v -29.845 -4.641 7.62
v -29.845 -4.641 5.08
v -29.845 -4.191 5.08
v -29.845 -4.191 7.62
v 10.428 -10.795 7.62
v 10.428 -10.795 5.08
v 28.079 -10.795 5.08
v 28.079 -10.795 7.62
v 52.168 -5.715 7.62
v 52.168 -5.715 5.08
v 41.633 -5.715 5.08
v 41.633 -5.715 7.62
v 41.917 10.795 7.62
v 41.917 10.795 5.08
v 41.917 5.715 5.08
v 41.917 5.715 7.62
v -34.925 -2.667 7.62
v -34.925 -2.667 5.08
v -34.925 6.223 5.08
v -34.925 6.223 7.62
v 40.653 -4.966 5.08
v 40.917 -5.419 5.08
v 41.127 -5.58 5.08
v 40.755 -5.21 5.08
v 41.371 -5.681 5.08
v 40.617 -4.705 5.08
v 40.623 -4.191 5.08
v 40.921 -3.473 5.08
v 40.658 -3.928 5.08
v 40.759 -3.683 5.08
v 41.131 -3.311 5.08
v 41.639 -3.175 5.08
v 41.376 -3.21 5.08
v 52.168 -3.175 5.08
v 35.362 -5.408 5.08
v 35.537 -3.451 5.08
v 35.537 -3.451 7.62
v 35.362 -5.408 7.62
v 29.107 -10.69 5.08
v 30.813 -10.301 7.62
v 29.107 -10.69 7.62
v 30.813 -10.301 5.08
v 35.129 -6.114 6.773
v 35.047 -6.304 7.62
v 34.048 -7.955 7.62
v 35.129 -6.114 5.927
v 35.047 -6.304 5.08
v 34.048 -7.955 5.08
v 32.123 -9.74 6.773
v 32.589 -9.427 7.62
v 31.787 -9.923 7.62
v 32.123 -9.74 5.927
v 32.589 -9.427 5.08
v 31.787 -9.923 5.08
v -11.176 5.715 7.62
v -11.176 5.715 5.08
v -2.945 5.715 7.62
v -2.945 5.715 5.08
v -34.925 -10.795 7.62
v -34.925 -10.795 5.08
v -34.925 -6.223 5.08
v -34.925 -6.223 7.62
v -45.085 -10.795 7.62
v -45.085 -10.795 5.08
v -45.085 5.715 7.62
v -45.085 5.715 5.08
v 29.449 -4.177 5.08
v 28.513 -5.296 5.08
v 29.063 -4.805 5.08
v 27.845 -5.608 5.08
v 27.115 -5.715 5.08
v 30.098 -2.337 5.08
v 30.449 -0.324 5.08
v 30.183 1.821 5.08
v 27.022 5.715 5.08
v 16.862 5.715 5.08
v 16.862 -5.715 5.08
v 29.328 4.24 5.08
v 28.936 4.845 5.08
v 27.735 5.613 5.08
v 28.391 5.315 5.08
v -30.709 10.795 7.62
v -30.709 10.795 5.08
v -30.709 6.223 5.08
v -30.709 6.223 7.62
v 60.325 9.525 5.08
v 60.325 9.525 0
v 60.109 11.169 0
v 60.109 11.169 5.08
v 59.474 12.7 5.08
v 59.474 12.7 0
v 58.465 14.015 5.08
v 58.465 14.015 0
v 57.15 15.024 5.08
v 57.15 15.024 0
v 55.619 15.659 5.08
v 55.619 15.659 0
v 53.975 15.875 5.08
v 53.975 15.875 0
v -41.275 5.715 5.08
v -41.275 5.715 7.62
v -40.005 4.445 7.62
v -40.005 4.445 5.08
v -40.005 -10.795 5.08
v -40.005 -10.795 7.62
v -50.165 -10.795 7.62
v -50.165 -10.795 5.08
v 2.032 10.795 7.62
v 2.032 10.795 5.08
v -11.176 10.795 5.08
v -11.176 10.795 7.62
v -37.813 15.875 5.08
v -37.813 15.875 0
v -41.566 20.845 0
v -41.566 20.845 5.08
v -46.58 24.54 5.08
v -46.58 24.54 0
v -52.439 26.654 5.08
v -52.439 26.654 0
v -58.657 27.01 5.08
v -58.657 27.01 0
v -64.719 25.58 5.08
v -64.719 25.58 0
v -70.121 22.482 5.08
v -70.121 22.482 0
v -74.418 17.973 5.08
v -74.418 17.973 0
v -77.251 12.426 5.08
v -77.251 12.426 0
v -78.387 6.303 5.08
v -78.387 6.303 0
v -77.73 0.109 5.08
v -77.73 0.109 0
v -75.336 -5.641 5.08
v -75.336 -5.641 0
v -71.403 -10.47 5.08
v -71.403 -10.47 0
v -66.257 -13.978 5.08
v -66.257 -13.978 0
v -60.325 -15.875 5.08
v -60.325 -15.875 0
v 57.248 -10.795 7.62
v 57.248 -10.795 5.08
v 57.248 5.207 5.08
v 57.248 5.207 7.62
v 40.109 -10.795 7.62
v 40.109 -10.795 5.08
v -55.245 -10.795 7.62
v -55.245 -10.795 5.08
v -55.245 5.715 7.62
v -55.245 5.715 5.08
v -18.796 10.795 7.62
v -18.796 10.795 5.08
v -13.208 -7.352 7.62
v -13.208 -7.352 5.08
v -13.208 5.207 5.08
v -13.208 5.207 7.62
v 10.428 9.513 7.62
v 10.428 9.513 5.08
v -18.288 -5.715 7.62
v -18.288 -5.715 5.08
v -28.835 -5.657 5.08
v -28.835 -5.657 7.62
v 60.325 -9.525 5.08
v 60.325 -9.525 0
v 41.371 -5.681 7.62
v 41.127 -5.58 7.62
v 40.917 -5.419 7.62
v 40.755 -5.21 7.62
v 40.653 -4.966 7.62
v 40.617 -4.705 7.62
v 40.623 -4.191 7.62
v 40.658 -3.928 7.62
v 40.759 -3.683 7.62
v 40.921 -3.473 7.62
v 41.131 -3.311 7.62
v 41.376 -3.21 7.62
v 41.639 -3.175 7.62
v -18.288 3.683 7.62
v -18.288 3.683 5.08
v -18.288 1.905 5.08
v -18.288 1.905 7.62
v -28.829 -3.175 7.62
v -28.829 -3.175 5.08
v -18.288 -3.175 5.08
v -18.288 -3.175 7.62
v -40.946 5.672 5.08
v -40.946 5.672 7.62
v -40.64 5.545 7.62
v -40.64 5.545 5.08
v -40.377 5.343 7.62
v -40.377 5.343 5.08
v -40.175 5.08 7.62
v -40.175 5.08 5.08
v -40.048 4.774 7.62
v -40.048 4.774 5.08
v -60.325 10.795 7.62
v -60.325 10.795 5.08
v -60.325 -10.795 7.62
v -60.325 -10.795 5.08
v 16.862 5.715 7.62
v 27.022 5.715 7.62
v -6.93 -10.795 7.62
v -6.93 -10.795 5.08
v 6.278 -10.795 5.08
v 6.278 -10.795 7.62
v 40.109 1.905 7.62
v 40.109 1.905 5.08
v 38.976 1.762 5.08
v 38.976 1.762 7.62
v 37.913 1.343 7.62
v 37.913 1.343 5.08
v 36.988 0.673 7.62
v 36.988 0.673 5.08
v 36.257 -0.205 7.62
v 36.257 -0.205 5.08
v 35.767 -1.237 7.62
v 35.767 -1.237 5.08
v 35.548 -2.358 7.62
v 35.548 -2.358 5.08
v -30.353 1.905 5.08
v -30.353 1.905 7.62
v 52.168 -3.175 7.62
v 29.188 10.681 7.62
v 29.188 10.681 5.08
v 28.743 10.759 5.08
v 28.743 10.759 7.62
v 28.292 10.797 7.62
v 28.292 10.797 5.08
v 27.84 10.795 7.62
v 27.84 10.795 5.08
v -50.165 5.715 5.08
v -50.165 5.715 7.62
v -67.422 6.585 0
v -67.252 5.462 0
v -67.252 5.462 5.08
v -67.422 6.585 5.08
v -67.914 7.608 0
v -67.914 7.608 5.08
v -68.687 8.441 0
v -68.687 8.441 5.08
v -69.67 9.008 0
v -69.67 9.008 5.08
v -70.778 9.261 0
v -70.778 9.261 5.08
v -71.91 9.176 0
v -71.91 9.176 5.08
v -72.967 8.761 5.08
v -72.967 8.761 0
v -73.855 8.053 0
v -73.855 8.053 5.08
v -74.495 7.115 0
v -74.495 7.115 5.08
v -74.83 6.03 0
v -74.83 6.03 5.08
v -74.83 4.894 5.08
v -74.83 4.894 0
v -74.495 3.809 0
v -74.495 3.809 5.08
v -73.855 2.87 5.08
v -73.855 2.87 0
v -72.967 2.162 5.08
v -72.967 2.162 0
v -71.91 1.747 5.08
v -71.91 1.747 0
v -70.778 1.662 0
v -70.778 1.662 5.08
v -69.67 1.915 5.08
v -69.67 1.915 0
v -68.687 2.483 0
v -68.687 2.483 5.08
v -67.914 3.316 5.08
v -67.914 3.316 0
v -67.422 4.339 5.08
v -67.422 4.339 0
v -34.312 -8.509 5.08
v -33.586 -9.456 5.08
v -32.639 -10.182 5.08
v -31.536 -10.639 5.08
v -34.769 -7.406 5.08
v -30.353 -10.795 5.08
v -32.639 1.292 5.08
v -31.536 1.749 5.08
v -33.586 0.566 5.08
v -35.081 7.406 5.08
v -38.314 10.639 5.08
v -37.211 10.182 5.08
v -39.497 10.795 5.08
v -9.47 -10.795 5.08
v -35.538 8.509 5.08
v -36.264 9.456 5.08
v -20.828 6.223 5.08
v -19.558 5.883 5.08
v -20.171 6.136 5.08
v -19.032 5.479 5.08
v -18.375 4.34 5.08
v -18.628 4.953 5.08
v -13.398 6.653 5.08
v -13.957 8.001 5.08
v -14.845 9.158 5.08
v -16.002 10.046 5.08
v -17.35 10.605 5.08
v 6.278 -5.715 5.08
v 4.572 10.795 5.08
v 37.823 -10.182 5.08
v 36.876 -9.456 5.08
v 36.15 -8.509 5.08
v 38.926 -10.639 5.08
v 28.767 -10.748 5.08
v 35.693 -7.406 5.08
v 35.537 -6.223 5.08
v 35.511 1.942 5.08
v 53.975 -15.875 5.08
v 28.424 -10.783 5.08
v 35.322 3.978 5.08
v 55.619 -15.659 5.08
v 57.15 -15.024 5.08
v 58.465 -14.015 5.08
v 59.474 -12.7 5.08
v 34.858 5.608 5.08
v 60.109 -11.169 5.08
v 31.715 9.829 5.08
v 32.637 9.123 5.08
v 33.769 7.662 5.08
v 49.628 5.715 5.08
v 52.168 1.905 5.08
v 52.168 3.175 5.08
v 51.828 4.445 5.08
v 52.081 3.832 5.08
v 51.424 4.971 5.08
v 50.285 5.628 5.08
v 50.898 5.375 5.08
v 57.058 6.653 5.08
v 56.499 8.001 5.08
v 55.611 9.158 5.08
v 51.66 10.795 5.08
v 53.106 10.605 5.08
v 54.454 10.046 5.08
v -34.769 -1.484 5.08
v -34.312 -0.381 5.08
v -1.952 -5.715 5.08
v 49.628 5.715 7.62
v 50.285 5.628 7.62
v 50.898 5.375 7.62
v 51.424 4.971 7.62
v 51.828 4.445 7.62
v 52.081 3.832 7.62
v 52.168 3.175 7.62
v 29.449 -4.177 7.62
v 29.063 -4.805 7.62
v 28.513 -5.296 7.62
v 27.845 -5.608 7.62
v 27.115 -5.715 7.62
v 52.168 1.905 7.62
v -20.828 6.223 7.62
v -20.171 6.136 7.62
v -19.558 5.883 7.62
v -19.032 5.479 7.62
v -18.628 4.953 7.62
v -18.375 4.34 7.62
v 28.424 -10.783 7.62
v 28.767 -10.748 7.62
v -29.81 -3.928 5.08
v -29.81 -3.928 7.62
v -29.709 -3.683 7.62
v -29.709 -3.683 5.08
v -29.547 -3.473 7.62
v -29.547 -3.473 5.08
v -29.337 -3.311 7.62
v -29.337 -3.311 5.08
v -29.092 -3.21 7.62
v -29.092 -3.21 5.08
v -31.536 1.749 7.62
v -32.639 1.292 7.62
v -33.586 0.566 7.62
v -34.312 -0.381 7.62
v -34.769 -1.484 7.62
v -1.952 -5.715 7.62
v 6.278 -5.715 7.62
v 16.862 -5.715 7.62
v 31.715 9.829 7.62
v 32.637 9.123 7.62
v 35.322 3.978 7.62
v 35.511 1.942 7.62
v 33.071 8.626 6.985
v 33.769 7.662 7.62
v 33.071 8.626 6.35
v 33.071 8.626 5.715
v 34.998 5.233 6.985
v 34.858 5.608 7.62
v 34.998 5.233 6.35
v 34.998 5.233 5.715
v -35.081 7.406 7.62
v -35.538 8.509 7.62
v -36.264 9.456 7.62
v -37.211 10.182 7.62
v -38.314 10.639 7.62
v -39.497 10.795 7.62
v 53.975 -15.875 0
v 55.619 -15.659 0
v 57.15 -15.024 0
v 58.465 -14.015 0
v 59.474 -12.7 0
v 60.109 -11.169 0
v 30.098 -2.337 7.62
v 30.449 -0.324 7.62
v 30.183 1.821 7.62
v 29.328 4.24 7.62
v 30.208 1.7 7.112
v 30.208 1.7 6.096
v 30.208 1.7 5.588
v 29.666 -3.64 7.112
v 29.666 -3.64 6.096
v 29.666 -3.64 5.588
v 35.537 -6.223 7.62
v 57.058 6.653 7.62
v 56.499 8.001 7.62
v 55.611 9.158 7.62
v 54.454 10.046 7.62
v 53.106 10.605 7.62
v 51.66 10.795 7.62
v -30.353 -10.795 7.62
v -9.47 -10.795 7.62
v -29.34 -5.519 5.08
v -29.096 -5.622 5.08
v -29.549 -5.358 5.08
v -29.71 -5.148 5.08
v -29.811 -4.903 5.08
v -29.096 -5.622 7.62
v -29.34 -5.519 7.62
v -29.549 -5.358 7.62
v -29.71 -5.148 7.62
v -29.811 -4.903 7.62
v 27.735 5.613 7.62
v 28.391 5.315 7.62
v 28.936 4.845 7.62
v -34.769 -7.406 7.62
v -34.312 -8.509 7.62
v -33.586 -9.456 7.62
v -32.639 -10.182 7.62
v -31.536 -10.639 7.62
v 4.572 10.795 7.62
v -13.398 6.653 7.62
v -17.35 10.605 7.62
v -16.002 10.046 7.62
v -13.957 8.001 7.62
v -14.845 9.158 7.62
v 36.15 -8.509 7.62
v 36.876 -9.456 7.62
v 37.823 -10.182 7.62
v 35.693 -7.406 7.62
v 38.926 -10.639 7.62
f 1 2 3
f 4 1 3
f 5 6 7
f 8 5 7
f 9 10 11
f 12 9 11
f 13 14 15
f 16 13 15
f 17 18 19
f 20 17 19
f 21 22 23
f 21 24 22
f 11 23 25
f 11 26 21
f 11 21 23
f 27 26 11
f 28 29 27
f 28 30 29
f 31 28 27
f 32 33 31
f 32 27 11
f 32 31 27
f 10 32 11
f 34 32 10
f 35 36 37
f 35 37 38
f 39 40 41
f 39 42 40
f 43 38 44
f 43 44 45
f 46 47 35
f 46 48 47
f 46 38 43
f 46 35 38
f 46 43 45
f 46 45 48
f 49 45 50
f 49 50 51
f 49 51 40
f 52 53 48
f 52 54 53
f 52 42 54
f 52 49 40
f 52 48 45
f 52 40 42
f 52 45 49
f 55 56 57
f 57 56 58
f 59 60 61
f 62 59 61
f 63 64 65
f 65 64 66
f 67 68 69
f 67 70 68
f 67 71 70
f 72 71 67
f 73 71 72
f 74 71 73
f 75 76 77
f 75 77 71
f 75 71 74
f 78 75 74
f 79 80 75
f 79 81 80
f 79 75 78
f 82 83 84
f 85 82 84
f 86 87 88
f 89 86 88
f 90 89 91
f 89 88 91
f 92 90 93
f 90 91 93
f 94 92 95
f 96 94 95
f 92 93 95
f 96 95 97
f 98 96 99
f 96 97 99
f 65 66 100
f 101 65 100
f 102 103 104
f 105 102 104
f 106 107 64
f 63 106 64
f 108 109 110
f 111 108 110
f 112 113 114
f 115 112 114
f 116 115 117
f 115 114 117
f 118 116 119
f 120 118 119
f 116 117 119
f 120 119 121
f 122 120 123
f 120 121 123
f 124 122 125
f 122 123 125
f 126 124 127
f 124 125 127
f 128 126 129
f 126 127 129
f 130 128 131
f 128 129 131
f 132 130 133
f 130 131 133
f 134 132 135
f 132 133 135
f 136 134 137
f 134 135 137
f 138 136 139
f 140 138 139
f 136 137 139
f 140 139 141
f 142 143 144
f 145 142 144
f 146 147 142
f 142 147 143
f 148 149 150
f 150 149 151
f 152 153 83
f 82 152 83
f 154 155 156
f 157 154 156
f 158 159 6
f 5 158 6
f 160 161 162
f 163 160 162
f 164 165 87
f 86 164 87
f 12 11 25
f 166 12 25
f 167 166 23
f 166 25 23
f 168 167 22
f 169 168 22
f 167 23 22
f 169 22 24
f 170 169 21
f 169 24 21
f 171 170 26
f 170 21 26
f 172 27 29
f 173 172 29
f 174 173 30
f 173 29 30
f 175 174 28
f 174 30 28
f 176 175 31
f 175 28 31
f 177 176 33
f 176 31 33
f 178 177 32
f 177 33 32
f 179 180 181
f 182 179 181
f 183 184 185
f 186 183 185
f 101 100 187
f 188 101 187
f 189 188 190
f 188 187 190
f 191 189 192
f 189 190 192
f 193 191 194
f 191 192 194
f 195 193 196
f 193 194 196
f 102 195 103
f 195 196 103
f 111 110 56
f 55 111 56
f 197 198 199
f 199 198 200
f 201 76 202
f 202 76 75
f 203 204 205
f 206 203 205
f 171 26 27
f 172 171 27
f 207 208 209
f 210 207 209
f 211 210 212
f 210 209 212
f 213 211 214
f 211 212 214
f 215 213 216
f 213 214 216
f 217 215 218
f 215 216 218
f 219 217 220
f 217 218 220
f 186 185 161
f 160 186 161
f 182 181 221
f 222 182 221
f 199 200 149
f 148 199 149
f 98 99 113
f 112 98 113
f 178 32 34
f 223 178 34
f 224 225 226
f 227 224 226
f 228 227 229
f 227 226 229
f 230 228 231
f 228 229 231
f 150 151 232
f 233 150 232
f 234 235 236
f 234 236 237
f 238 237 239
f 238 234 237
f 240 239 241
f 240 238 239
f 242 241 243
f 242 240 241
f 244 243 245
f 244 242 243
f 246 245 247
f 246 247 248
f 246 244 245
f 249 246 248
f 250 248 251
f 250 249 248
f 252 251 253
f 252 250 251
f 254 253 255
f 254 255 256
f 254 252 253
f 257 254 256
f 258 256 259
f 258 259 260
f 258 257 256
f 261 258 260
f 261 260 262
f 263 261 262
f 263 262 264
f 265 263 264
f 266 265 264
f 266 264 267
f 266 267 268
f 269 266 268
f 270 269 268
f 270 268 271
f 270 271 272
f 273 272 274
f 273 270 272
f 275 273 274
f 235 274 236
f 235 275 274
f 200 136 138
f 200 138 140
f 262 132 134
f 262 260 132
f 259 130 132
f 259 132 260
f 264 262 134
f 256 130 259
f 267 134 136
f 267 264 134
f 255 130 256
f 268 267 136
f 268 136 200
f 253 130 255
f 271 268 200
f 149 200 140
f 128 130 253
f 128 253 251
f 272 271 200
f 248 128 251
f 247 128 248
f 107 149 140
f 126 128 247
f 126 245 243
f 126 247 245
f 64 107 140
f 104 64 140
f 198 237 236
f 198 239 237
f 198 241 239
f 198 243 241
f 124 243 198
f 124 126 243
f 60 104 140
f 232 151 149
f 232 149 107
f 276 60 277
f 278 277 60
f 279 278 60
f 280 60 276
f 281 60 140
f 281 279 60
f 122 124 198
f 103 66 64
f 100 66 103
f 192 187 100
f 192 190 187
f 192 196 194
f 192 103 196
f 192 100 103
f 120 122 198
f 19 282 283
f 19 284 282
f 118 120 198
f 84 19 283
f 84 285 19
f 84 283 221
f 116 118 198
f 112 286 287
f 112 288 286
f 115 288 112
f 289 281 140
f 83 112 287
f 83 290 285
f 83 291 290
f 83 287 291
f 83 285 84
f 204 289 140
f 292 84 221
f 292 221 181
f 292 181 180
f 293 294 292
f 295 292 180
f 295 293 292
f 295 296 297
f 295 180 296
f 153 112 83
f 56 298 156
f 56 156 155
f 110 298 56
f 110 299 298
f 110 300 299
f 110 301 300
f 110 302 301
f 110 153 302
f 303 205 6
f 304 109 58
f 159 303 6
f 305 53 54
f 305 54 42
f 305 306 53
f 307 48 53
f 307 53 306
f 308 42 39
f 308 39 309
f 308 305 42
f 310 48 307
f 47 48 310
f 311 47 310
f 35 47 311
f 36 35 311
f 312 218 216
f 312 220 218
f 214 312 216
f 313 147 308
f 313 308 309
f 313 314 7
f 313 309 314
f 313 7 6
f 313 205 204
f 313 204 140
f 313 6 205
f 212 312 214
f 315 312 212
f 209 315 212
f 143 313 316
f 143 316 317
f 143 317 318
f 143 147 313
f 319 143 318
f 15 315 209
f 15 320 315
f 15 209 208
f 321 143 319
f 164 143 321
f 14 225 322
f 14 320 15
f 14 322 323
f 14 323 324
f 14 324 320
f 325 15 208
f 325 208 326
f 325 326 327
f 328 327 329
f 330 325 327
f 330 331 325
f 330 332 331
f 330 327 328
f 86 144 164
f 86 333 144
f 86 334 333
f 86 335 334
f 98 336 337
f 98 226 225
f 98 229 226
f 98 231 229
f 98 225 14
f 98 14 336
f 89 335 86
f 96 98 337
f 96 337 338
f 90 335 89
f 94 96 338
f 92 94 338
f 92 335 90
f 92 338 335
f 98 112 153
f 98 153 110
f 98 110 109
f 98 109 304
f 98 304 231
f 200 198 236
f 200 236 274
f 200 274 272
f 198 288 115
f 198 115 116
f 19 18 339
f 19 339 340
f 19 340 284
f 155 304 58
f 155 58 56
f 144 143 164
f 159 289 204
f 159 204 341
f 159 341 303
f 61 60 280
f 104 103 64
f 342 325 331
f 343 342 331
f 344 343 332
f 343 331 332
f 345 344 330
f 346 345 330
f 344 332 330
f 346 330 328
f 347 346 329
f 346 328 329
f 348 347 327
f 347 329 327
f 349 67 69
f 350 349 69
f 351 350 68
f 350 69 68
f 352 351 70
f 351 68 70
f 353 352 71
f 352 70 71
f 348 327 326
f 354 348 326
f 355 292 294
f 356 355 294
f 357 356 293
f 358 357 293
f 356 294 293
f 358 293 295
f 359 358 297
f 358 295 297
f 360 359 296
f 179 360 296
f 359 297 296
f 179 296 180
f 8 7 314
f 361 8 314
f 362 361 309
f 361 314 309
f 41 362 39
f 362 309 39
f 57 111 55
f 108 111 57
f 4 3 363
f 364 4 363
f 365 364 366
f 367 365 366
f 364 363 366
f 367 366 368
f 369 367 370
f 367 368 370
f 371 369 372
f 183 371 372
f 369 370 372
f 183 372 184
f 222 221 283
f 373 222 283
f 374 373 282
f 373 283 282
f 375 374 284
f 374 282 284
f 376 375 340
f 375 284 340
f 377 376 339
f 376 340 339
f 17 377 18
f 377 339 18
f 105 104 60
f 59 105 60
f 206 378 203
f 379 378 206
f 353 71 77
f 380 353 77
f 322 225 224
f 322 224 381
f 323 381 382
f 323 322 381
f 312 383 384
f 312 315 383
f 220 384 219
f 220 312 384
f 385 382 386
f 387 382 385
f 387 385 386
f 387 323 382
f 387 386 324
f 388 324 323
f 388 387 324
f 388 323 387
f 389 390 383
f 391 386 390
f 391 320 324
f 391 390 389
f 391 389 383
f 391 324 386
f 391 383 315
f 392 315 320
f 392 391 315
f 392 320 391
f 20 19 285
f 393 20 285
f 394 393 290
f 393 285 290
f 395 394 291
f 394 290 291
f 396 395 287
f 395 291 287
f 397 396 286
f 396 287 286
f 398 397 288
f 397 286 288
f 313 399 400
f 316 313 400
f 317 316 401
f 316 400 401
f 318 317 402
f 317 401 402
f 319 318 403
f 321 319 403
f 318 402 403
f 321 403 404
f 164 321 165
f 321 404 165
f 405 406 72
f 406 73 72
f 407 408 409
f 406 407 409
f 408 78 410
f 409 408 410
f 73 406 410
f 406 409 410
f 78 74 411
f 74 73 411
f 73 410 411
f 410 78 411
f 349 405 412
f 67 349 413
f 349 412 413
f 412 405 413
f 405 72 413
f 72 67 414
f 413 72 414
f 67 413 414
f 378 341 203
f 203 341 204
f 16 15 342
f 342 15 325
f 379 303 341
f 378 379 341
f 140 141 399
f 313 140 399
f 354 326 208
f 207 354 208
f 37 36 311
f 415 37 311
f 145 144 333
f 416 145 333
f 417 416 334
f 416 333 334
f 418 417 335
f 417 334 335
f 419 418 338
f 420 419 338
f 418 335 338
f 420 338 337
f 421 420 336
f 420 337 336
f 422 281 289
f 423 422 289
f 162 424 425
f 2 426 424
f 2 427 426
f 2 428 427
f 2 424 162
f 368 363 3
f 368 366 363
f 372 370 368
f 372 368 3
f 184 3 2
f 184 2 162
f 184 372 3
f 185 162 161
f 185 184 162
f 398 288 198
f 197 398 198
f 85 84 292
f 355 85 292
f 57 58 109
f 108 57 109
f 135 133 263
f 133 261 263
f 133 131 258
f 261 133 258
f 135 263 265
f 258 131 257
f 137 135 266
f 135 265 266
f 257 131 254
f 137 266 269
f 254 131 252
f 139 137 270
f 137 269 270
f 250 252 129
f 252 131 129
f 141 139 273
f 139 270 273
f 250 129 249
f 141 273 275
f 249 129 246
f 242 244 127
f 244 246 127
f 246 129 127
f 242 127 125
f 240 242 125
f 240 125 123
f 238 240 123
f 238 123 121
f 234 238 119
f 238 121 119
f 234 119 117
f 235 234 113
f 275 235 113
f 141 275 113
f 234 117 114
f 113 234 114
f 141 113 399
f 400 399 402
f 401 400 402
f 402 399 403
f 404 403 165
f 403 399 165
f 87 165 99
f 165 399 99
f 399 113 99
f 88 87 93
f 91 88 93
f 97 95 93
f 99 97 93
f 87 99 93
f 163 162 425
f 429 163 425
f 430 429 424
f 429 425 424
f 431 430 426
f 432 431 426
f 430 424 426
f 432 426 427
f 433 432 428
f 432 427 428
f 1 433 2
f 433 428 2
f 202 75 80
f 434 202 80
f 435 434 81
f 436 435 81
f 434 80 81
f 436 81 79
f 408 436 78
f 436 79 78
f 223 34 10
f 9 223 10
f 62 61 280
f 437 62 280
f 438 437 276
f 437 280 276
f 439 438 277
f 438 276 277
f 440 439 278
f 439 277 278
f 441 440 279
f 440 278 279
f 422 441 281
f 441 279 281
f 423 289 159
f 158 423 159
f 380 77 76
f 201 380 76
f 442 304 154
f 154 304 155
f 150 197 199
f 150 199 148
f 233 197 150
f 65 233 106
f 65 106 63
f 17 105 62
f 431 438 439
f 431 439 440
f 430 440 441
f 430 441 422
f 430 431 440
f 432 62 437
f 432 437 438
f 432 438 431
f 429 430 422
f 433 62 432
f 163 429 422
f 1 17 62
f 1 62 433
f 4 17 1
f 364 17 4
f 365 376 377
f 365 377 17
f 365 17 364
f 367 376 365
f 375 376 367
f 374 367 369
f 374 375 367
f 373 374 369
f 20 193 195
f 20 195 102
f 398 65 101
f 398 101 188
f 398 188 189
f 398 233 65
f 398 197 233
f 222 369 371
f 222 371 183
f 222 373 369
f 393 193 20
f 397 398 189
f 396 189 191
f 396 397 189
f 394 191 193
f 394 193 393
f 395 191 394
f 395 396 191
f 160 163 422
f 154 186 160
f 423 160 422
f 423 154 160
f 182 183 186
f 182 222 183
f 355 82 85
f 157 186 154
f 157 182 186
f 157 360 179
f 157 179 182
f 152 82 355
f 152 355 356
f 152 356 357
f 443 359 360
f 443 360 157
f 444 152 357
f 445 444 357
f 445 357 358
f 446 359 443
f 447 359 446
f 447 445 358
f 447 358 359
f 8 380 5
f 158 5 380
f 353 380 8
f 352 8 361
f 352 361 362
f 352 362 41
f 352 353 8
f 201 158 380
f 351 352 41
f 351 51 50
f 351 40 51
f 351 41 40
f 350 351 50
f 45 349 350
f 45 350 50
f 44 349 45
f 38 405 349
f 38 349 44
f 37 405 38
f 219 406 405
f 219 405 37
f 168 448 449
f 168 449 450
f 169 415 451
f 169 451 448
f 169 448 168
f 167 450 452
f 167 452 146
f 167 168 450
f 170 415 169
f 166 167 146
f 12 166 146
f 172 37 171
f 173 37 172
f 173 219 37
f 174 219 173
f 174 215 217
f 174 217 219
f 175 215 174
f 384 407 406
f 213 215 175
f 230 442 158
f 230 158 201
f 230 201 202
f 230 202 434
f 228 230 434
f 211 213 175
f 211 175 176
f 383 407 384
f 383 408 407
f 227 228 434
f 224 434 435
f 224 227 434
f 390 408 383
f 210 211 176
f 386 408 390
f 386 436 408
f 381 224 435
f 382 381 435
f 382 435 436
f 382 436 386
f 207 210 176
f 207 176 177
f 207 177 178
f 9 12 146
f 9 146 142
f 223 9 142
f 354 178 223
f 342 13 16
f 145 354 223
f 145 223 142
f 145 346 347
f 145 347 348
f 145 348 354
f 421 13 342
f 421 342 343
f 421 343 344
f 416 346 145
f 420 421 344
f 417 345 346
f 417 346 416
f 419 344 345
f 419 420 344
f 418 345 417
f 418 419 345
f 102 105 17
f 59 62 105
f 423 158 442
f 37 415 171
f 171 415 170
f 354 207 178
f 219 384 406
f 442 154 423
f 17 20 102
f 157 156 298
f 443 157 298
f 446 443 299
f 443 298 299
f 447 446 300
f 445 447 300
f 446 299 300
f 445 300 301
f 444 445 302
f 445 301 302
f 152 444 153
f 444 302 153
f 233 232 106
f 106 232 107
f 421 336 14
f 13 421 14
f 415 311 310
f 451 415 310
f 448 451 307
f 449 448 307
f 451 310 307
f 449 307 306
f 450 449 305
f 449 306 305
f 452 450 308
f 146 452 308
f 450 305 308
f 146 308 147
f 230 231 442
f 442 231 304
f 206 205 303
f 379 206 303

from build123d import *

# Parameters (mm, degrees)
F0_R     = 3.81
F1_DEPTH = 5.08
F3_DEPTH = 2.54


with BuildPart() as f1:
    # F0 (on Top) → F1 (new body)
    with BuildSketch(Plane.XY):
        with BuildLine():
            Line((-60.325, -15.875), (53.975, -15.875))
            ThreePointArc((53.975, -15.875), (58.4651280605, -14.0151280605), (60.325, -9.525))
            Line((60.325, -9.525), (60.325, 9.525))
            ThreePointArc((60.325, 9.525), (58.4651280605, 14.0151280605), (53.975, 15.875))
            Line((53.975, 15.875), (-37.8134731769, 15.875))
            Line((-37.8134731769, 15.875), (-60.325, 15.875))
            Line((-60.325, 15.875), (-60.325, -15.875))
        make_face()
        with BuildLine():
            ThreePointArc((-37.8134731769, 15.875), (-74.4177446928, 17.9727124446), (-60.325, -15.875))
            Line((-60.325, -15.875), (-60.325, 15.875))
            Line((-60.325, 15.875), (-37.8134731769, 15.875))
        make_face()
        with Locations((-71.0623143972, 5.4617850045)):
            Circle(F0_R, mode=Mode.SUBTRACT)
    extrude(amount=F1_DEPTH)

    # F2 (on face) → F3 (join)
    with BuildSketch(Plane.XY.offset(5.08)):
        with BuildLine():
            Line((-55.2302619128, 10.795), (-60.325, 10.795))
            Line((-60.325, 10.795), (-60.325, -10.795))
            Line((-60.325, -10.795), (-55.245, -10.795))
            Line((-55.245, -10.795), (-55.245, 5.715))
            Line((-55.245, 5.715), (-50.165, 5.715))
            Line((-50.165, 5.715), (-50.165, -10.795))
            Line((-50.165, -10.795), (-45.085, -10.795))
            Line((-45.085, -10.795), (-45.085, 5.715))
            Line((-45.085, 5.715), (-41.275, 5.715))
            ThreePointArc((-41.275, 5.715), (-40.3769743879, 5.3430256121), (-40.005, 4.445))
            Line((-40.005, 4.445), (-40.005, -10.795))
            Line((-40.005, -10.795), (-34.925, -10.795))
            Line((-34.925, -10.795), (-34.925, -6.223))
            Line((-34.925, -6.223), (-34.925, -2.667))
            Line((-34.925, -2.667), (-34.925, 6.223))
            ThreePointArc((-34.925, 6.223), (-36.2641077964, 9.4558922036), (-39.497, 10.795))
            Line((-39.497, 10.795), (-55.2302619128, 10.795))
        make_face()
        with BuildLine():
            ThreePointArc((-30.353, 1.905), (-33.5858922036, 0.5658922036), (-34.925, -2.667))
            Line((-34.925, -2.667), (-34.925, -6.223))
            ThreePointArc((-34.925, -6.223), (-33.5858922036, -9.4558922036), (-30.353, -10.795))
            Line((-30.353, -10.795), (-13.208, -10.795))
            Line((-13.208, -10.795), (-13.208, -7.3516365111))
            Line((-13.208, -7.3516365111), (-13.208, 5.207))
            ThreePointArc((-13.208, 5.207), (-14.8446873067, 9.1583126933), (-18.796, 10.795))
            Line((-18.796, 10.795), (-30.7090226255, 10.795))
            Line((-30.7090226255, 10.795), (-30.7090226255, 6.223))
            Line((-30.7090226255, 6.223), (-20.828, 6.223))
            ThreePointArc((-20.828, 6.223), (-19.0319487758, 5.4790512242), (-18.288, 3.683))
            Line((-18.288, 3.683), (-18.288, 1.905))
            Line((-18.288, 1.905), (-30.353, 1.905))
        make_face()
        with BuildLine():
            ThreePointArc((-28.834547457, -5.6574139856), (-29.5493791419, -5.3578856134), (-29.845, -4.6414291305))
            Line((-29.845, -4.6414291305), (-29.845, -4.191))
            ThreePointArc((-29.845, -4.191), (-29.5474204897, -3.4725795103), (-28.829, -3.175))
            Line((-28.829, -3.175), (-18.288, -3.175))
            Line((-18.288, -3.175), (-18.288, -5.715))
            Line((-18.288, -5.715), (-28.834547457, -5.6574139856))
        make_face(mode=Mode.SUBTRACT)
        Polygon((-13.208, -7.3516365111), (-13.208, -10.795), (-9.4697934187, -10.795), (10.4281250387, 9.5132279851), (11.684, 10.795), (4.572, 10.795), align=None)
        with BuildLine():
            Line((11.684, 10.795), (10.4281250387, 9.5132279851))
            Line((10.4281250387, 9.5132279851), (10.4281250387, -10.795))
            Line((10.4281250387, -10.795), (11.684, -10.795))
            Line((11.684, -10.795), (28.078978887, -10.795))
            ThreePointArc((28.078978887, -10.795), (28.5957282879, -10.7686491822), (29.107116756, -10.6898701011))
            add(Edge.make_bspline(
                [(35.5372950435, -3.4511573613), (35.5250543244, -4.4661306449), (35.4891126843, -6.1377135055), (32.635648268, -10.1114027049), (29.9885608199, -10.5077053404), (29.107116756, -10.6898701011)],
                knots=[0.5939858484, 0.5939858484, 0.5939858484, 0.5939858484, 0.7105364175, 0.864635629, 0.978892706, 0.978892706, 0.978892706, 0.978892706], degree=3))
            Line((35.5372950435, -3.4511573613), (35.5372950435, -2.667))
            ThreePointArc((35.5372950435, -2.667), (35.5399098941, -2.512392897), (35.5477514548, -2.357962642))
            add(Edge.make_bspline(
                [(29.1883741966, 10.6813906829), (31.5964348364, 10.1488972227), (32.9847348448, 9.0372084423), (35.3473079701, 5.2056335604), (35.5537470863, 1.8236524058), (35.5559992426, -1.172556692), (35.5477514548, -2.357962642)],
                knots=[0.0105029487, 0.0105029487, 0.0105029487, 0.0105029487, 0.1576260779, 0.2979024518, 0.437582628, 0.5553822916, 0.5553822916, 0.5553822916, 0.5553822916], degree=3))
            ThreePointArc((29.1883741966, 10.6813906829), (28.518143702, 10.7832706341), (27.8403156543, 10.795))
            Line((27.8403156543, 10.795), (11.684, 10.795))
        make_face()
        with BuildLine():
            Line((27.1152709564, -5.715), (16.8622714295, -5.715))
            Line((16.8622714295, -5.715), (16.8622714295, 5.715))
            Line((16.8622714295, 5.715), (27.0222714295, 5.715))
            ThreePointArc((27.0222714295, 5.715), (28.3907110889, 5.3148534759), (29.3279882498, 4.2404904712))
            add(Edge.make_bspline(
                [(29.3279882498, 4.2404904712), (29.5322218703, 3.7985297904), (29.996949748, 2.7568174276), (30.1980545584, 1.7073743386), (30.6864836685, -0.4549893431), (29.9611913367, -2.9197379799), (29.5225347313, -4.0063798282), (29.4492436994, -4.177083447)],
                knots=[0.1184445178, 0.1184445178, 0.1184445178, 0.1184445178, 0.2235550269, 0.3756131932, 0.564595644, 0.8021758999, 0.8487485979, 0.8487485979, 0.8487485979, 0.8487485979], degree=3))
            ThreePointArc((29.4492436994, -4.177083447), (28.5128238256, -5.2959540253), (27.1152709564, -5.715))
        make_face(mode=Mode.SUBTRACT)
        with BuildLine():
            ThreePointArc((40.1092950435, 1.905), (36.9875755494, 0.6733669559), (35.5477514548, -2.357962642))
            add(Edge.make_bspline(
                [(35.5477514548, -2.357962642), (35.5450486122, -2.7464262804), (35.5413493806, -3.1149807203), (35.5372950435, -3.4511573613)],
                knots=[0.5553822916, 0.5553822916, 0.5553822916, 0.5553822916, 0.5939858484, 0.5939858484, 0.5939858484, 0.5939858484], degree=3))
            Line((35.5372950435, -3.4511573613), (35.5372950435, -6.223))
            ThreePointArc((35.5372950435, -6.223), (36.8764028399, -9.4558922036), (40.1092950435, -10.795))
            Line((40.1092950435, -10.795), (57.2480400174, -10.795))
            Line((57.2480400174, -10.795), (57.2480400174, 5.207))
            ThreePointArc((57.2480400174, 5.207), (55.6113527107, 9.1583126933), (51.6600400174, 10.795))
            Line((51.6600400174, 10.795), (46.4887204891, 10.795))
            Line((46.4887204891, 10.795), (41.9167204891, 10.795))
            Line((41.9167204891, 10.795), (41.9167204891, 6.223))
            Line((41.9167204891, 6.223), (41.9167204891, 5.715))
            Line((41.9167204891, 5.715), (49.6280400174, 5.715))
            ThreePointArc((49.6280400174, 5.715), (51.4240912417, 4.9710512242), (52.1680400174, 3.175))
            Line((52.1680400174, 3.175), (52.1680400174, 1.905))
            Line((52.1680400174, 1.905), (40.1092950435, 1.905))
        make_face()
        with BuildLine():
            ThreePointArc((40.622984476, -4.191), (40.9205639863, -3.4725795103), (41.638984476, -3.175))
            Line((41.638984476, -3.175), (52.1680400174, -3.175))
            Line((52.1680400174, -3.175), (52.1680400174, -5.715))
            Line((52.1680400174, -5.715), (41.6332798985, -5.715))
            ThreePointArc((41.6332798985, -5.715), (40.9168234157, -5.4193791419), (40.6172950435, -4.704547457))
            Line((40.6172950435, -4.704547457), (40.622984476, -4.191))
        make_face(mode=Mode.SUBTRACT)
        with BuildLine():
            add(Edge.make_bspline(
                [(35.5477514548, -2.357962642), (35.5450486122, -2.7464262804), (35.5413493806, -3.1149807203), (35.5372950435, -3.4511573613)],
                knots=[0.5553822916, 0.5553822916, 0.5553822916, 0.5553822916, 0.5939858484, 0.5939858484, 0.5939858484, 0.5939858484], degree=3))
            ThreePointArc((35.5477514548, -2.357962642), (35.5399098941, -2.512392897), (35.5372950435, -2.667))
            Line((35.5372950435, -2.667), (35.5372950435, -3.4511573613))
        make_face()
        Polygon((-2.9453631573, 5.715), (2.032, 10.795), (-11.176, 10.795), (-11.176, 5.715), align=None)
        Polygon((-1.9524302613, -5.715), (-6.9297934187, -10.795), (6.2782065813, -10.795), (6.2782065813, -5.715), align=None)
    extrude(amount=F3_DEPTH)


solid = f1.part
